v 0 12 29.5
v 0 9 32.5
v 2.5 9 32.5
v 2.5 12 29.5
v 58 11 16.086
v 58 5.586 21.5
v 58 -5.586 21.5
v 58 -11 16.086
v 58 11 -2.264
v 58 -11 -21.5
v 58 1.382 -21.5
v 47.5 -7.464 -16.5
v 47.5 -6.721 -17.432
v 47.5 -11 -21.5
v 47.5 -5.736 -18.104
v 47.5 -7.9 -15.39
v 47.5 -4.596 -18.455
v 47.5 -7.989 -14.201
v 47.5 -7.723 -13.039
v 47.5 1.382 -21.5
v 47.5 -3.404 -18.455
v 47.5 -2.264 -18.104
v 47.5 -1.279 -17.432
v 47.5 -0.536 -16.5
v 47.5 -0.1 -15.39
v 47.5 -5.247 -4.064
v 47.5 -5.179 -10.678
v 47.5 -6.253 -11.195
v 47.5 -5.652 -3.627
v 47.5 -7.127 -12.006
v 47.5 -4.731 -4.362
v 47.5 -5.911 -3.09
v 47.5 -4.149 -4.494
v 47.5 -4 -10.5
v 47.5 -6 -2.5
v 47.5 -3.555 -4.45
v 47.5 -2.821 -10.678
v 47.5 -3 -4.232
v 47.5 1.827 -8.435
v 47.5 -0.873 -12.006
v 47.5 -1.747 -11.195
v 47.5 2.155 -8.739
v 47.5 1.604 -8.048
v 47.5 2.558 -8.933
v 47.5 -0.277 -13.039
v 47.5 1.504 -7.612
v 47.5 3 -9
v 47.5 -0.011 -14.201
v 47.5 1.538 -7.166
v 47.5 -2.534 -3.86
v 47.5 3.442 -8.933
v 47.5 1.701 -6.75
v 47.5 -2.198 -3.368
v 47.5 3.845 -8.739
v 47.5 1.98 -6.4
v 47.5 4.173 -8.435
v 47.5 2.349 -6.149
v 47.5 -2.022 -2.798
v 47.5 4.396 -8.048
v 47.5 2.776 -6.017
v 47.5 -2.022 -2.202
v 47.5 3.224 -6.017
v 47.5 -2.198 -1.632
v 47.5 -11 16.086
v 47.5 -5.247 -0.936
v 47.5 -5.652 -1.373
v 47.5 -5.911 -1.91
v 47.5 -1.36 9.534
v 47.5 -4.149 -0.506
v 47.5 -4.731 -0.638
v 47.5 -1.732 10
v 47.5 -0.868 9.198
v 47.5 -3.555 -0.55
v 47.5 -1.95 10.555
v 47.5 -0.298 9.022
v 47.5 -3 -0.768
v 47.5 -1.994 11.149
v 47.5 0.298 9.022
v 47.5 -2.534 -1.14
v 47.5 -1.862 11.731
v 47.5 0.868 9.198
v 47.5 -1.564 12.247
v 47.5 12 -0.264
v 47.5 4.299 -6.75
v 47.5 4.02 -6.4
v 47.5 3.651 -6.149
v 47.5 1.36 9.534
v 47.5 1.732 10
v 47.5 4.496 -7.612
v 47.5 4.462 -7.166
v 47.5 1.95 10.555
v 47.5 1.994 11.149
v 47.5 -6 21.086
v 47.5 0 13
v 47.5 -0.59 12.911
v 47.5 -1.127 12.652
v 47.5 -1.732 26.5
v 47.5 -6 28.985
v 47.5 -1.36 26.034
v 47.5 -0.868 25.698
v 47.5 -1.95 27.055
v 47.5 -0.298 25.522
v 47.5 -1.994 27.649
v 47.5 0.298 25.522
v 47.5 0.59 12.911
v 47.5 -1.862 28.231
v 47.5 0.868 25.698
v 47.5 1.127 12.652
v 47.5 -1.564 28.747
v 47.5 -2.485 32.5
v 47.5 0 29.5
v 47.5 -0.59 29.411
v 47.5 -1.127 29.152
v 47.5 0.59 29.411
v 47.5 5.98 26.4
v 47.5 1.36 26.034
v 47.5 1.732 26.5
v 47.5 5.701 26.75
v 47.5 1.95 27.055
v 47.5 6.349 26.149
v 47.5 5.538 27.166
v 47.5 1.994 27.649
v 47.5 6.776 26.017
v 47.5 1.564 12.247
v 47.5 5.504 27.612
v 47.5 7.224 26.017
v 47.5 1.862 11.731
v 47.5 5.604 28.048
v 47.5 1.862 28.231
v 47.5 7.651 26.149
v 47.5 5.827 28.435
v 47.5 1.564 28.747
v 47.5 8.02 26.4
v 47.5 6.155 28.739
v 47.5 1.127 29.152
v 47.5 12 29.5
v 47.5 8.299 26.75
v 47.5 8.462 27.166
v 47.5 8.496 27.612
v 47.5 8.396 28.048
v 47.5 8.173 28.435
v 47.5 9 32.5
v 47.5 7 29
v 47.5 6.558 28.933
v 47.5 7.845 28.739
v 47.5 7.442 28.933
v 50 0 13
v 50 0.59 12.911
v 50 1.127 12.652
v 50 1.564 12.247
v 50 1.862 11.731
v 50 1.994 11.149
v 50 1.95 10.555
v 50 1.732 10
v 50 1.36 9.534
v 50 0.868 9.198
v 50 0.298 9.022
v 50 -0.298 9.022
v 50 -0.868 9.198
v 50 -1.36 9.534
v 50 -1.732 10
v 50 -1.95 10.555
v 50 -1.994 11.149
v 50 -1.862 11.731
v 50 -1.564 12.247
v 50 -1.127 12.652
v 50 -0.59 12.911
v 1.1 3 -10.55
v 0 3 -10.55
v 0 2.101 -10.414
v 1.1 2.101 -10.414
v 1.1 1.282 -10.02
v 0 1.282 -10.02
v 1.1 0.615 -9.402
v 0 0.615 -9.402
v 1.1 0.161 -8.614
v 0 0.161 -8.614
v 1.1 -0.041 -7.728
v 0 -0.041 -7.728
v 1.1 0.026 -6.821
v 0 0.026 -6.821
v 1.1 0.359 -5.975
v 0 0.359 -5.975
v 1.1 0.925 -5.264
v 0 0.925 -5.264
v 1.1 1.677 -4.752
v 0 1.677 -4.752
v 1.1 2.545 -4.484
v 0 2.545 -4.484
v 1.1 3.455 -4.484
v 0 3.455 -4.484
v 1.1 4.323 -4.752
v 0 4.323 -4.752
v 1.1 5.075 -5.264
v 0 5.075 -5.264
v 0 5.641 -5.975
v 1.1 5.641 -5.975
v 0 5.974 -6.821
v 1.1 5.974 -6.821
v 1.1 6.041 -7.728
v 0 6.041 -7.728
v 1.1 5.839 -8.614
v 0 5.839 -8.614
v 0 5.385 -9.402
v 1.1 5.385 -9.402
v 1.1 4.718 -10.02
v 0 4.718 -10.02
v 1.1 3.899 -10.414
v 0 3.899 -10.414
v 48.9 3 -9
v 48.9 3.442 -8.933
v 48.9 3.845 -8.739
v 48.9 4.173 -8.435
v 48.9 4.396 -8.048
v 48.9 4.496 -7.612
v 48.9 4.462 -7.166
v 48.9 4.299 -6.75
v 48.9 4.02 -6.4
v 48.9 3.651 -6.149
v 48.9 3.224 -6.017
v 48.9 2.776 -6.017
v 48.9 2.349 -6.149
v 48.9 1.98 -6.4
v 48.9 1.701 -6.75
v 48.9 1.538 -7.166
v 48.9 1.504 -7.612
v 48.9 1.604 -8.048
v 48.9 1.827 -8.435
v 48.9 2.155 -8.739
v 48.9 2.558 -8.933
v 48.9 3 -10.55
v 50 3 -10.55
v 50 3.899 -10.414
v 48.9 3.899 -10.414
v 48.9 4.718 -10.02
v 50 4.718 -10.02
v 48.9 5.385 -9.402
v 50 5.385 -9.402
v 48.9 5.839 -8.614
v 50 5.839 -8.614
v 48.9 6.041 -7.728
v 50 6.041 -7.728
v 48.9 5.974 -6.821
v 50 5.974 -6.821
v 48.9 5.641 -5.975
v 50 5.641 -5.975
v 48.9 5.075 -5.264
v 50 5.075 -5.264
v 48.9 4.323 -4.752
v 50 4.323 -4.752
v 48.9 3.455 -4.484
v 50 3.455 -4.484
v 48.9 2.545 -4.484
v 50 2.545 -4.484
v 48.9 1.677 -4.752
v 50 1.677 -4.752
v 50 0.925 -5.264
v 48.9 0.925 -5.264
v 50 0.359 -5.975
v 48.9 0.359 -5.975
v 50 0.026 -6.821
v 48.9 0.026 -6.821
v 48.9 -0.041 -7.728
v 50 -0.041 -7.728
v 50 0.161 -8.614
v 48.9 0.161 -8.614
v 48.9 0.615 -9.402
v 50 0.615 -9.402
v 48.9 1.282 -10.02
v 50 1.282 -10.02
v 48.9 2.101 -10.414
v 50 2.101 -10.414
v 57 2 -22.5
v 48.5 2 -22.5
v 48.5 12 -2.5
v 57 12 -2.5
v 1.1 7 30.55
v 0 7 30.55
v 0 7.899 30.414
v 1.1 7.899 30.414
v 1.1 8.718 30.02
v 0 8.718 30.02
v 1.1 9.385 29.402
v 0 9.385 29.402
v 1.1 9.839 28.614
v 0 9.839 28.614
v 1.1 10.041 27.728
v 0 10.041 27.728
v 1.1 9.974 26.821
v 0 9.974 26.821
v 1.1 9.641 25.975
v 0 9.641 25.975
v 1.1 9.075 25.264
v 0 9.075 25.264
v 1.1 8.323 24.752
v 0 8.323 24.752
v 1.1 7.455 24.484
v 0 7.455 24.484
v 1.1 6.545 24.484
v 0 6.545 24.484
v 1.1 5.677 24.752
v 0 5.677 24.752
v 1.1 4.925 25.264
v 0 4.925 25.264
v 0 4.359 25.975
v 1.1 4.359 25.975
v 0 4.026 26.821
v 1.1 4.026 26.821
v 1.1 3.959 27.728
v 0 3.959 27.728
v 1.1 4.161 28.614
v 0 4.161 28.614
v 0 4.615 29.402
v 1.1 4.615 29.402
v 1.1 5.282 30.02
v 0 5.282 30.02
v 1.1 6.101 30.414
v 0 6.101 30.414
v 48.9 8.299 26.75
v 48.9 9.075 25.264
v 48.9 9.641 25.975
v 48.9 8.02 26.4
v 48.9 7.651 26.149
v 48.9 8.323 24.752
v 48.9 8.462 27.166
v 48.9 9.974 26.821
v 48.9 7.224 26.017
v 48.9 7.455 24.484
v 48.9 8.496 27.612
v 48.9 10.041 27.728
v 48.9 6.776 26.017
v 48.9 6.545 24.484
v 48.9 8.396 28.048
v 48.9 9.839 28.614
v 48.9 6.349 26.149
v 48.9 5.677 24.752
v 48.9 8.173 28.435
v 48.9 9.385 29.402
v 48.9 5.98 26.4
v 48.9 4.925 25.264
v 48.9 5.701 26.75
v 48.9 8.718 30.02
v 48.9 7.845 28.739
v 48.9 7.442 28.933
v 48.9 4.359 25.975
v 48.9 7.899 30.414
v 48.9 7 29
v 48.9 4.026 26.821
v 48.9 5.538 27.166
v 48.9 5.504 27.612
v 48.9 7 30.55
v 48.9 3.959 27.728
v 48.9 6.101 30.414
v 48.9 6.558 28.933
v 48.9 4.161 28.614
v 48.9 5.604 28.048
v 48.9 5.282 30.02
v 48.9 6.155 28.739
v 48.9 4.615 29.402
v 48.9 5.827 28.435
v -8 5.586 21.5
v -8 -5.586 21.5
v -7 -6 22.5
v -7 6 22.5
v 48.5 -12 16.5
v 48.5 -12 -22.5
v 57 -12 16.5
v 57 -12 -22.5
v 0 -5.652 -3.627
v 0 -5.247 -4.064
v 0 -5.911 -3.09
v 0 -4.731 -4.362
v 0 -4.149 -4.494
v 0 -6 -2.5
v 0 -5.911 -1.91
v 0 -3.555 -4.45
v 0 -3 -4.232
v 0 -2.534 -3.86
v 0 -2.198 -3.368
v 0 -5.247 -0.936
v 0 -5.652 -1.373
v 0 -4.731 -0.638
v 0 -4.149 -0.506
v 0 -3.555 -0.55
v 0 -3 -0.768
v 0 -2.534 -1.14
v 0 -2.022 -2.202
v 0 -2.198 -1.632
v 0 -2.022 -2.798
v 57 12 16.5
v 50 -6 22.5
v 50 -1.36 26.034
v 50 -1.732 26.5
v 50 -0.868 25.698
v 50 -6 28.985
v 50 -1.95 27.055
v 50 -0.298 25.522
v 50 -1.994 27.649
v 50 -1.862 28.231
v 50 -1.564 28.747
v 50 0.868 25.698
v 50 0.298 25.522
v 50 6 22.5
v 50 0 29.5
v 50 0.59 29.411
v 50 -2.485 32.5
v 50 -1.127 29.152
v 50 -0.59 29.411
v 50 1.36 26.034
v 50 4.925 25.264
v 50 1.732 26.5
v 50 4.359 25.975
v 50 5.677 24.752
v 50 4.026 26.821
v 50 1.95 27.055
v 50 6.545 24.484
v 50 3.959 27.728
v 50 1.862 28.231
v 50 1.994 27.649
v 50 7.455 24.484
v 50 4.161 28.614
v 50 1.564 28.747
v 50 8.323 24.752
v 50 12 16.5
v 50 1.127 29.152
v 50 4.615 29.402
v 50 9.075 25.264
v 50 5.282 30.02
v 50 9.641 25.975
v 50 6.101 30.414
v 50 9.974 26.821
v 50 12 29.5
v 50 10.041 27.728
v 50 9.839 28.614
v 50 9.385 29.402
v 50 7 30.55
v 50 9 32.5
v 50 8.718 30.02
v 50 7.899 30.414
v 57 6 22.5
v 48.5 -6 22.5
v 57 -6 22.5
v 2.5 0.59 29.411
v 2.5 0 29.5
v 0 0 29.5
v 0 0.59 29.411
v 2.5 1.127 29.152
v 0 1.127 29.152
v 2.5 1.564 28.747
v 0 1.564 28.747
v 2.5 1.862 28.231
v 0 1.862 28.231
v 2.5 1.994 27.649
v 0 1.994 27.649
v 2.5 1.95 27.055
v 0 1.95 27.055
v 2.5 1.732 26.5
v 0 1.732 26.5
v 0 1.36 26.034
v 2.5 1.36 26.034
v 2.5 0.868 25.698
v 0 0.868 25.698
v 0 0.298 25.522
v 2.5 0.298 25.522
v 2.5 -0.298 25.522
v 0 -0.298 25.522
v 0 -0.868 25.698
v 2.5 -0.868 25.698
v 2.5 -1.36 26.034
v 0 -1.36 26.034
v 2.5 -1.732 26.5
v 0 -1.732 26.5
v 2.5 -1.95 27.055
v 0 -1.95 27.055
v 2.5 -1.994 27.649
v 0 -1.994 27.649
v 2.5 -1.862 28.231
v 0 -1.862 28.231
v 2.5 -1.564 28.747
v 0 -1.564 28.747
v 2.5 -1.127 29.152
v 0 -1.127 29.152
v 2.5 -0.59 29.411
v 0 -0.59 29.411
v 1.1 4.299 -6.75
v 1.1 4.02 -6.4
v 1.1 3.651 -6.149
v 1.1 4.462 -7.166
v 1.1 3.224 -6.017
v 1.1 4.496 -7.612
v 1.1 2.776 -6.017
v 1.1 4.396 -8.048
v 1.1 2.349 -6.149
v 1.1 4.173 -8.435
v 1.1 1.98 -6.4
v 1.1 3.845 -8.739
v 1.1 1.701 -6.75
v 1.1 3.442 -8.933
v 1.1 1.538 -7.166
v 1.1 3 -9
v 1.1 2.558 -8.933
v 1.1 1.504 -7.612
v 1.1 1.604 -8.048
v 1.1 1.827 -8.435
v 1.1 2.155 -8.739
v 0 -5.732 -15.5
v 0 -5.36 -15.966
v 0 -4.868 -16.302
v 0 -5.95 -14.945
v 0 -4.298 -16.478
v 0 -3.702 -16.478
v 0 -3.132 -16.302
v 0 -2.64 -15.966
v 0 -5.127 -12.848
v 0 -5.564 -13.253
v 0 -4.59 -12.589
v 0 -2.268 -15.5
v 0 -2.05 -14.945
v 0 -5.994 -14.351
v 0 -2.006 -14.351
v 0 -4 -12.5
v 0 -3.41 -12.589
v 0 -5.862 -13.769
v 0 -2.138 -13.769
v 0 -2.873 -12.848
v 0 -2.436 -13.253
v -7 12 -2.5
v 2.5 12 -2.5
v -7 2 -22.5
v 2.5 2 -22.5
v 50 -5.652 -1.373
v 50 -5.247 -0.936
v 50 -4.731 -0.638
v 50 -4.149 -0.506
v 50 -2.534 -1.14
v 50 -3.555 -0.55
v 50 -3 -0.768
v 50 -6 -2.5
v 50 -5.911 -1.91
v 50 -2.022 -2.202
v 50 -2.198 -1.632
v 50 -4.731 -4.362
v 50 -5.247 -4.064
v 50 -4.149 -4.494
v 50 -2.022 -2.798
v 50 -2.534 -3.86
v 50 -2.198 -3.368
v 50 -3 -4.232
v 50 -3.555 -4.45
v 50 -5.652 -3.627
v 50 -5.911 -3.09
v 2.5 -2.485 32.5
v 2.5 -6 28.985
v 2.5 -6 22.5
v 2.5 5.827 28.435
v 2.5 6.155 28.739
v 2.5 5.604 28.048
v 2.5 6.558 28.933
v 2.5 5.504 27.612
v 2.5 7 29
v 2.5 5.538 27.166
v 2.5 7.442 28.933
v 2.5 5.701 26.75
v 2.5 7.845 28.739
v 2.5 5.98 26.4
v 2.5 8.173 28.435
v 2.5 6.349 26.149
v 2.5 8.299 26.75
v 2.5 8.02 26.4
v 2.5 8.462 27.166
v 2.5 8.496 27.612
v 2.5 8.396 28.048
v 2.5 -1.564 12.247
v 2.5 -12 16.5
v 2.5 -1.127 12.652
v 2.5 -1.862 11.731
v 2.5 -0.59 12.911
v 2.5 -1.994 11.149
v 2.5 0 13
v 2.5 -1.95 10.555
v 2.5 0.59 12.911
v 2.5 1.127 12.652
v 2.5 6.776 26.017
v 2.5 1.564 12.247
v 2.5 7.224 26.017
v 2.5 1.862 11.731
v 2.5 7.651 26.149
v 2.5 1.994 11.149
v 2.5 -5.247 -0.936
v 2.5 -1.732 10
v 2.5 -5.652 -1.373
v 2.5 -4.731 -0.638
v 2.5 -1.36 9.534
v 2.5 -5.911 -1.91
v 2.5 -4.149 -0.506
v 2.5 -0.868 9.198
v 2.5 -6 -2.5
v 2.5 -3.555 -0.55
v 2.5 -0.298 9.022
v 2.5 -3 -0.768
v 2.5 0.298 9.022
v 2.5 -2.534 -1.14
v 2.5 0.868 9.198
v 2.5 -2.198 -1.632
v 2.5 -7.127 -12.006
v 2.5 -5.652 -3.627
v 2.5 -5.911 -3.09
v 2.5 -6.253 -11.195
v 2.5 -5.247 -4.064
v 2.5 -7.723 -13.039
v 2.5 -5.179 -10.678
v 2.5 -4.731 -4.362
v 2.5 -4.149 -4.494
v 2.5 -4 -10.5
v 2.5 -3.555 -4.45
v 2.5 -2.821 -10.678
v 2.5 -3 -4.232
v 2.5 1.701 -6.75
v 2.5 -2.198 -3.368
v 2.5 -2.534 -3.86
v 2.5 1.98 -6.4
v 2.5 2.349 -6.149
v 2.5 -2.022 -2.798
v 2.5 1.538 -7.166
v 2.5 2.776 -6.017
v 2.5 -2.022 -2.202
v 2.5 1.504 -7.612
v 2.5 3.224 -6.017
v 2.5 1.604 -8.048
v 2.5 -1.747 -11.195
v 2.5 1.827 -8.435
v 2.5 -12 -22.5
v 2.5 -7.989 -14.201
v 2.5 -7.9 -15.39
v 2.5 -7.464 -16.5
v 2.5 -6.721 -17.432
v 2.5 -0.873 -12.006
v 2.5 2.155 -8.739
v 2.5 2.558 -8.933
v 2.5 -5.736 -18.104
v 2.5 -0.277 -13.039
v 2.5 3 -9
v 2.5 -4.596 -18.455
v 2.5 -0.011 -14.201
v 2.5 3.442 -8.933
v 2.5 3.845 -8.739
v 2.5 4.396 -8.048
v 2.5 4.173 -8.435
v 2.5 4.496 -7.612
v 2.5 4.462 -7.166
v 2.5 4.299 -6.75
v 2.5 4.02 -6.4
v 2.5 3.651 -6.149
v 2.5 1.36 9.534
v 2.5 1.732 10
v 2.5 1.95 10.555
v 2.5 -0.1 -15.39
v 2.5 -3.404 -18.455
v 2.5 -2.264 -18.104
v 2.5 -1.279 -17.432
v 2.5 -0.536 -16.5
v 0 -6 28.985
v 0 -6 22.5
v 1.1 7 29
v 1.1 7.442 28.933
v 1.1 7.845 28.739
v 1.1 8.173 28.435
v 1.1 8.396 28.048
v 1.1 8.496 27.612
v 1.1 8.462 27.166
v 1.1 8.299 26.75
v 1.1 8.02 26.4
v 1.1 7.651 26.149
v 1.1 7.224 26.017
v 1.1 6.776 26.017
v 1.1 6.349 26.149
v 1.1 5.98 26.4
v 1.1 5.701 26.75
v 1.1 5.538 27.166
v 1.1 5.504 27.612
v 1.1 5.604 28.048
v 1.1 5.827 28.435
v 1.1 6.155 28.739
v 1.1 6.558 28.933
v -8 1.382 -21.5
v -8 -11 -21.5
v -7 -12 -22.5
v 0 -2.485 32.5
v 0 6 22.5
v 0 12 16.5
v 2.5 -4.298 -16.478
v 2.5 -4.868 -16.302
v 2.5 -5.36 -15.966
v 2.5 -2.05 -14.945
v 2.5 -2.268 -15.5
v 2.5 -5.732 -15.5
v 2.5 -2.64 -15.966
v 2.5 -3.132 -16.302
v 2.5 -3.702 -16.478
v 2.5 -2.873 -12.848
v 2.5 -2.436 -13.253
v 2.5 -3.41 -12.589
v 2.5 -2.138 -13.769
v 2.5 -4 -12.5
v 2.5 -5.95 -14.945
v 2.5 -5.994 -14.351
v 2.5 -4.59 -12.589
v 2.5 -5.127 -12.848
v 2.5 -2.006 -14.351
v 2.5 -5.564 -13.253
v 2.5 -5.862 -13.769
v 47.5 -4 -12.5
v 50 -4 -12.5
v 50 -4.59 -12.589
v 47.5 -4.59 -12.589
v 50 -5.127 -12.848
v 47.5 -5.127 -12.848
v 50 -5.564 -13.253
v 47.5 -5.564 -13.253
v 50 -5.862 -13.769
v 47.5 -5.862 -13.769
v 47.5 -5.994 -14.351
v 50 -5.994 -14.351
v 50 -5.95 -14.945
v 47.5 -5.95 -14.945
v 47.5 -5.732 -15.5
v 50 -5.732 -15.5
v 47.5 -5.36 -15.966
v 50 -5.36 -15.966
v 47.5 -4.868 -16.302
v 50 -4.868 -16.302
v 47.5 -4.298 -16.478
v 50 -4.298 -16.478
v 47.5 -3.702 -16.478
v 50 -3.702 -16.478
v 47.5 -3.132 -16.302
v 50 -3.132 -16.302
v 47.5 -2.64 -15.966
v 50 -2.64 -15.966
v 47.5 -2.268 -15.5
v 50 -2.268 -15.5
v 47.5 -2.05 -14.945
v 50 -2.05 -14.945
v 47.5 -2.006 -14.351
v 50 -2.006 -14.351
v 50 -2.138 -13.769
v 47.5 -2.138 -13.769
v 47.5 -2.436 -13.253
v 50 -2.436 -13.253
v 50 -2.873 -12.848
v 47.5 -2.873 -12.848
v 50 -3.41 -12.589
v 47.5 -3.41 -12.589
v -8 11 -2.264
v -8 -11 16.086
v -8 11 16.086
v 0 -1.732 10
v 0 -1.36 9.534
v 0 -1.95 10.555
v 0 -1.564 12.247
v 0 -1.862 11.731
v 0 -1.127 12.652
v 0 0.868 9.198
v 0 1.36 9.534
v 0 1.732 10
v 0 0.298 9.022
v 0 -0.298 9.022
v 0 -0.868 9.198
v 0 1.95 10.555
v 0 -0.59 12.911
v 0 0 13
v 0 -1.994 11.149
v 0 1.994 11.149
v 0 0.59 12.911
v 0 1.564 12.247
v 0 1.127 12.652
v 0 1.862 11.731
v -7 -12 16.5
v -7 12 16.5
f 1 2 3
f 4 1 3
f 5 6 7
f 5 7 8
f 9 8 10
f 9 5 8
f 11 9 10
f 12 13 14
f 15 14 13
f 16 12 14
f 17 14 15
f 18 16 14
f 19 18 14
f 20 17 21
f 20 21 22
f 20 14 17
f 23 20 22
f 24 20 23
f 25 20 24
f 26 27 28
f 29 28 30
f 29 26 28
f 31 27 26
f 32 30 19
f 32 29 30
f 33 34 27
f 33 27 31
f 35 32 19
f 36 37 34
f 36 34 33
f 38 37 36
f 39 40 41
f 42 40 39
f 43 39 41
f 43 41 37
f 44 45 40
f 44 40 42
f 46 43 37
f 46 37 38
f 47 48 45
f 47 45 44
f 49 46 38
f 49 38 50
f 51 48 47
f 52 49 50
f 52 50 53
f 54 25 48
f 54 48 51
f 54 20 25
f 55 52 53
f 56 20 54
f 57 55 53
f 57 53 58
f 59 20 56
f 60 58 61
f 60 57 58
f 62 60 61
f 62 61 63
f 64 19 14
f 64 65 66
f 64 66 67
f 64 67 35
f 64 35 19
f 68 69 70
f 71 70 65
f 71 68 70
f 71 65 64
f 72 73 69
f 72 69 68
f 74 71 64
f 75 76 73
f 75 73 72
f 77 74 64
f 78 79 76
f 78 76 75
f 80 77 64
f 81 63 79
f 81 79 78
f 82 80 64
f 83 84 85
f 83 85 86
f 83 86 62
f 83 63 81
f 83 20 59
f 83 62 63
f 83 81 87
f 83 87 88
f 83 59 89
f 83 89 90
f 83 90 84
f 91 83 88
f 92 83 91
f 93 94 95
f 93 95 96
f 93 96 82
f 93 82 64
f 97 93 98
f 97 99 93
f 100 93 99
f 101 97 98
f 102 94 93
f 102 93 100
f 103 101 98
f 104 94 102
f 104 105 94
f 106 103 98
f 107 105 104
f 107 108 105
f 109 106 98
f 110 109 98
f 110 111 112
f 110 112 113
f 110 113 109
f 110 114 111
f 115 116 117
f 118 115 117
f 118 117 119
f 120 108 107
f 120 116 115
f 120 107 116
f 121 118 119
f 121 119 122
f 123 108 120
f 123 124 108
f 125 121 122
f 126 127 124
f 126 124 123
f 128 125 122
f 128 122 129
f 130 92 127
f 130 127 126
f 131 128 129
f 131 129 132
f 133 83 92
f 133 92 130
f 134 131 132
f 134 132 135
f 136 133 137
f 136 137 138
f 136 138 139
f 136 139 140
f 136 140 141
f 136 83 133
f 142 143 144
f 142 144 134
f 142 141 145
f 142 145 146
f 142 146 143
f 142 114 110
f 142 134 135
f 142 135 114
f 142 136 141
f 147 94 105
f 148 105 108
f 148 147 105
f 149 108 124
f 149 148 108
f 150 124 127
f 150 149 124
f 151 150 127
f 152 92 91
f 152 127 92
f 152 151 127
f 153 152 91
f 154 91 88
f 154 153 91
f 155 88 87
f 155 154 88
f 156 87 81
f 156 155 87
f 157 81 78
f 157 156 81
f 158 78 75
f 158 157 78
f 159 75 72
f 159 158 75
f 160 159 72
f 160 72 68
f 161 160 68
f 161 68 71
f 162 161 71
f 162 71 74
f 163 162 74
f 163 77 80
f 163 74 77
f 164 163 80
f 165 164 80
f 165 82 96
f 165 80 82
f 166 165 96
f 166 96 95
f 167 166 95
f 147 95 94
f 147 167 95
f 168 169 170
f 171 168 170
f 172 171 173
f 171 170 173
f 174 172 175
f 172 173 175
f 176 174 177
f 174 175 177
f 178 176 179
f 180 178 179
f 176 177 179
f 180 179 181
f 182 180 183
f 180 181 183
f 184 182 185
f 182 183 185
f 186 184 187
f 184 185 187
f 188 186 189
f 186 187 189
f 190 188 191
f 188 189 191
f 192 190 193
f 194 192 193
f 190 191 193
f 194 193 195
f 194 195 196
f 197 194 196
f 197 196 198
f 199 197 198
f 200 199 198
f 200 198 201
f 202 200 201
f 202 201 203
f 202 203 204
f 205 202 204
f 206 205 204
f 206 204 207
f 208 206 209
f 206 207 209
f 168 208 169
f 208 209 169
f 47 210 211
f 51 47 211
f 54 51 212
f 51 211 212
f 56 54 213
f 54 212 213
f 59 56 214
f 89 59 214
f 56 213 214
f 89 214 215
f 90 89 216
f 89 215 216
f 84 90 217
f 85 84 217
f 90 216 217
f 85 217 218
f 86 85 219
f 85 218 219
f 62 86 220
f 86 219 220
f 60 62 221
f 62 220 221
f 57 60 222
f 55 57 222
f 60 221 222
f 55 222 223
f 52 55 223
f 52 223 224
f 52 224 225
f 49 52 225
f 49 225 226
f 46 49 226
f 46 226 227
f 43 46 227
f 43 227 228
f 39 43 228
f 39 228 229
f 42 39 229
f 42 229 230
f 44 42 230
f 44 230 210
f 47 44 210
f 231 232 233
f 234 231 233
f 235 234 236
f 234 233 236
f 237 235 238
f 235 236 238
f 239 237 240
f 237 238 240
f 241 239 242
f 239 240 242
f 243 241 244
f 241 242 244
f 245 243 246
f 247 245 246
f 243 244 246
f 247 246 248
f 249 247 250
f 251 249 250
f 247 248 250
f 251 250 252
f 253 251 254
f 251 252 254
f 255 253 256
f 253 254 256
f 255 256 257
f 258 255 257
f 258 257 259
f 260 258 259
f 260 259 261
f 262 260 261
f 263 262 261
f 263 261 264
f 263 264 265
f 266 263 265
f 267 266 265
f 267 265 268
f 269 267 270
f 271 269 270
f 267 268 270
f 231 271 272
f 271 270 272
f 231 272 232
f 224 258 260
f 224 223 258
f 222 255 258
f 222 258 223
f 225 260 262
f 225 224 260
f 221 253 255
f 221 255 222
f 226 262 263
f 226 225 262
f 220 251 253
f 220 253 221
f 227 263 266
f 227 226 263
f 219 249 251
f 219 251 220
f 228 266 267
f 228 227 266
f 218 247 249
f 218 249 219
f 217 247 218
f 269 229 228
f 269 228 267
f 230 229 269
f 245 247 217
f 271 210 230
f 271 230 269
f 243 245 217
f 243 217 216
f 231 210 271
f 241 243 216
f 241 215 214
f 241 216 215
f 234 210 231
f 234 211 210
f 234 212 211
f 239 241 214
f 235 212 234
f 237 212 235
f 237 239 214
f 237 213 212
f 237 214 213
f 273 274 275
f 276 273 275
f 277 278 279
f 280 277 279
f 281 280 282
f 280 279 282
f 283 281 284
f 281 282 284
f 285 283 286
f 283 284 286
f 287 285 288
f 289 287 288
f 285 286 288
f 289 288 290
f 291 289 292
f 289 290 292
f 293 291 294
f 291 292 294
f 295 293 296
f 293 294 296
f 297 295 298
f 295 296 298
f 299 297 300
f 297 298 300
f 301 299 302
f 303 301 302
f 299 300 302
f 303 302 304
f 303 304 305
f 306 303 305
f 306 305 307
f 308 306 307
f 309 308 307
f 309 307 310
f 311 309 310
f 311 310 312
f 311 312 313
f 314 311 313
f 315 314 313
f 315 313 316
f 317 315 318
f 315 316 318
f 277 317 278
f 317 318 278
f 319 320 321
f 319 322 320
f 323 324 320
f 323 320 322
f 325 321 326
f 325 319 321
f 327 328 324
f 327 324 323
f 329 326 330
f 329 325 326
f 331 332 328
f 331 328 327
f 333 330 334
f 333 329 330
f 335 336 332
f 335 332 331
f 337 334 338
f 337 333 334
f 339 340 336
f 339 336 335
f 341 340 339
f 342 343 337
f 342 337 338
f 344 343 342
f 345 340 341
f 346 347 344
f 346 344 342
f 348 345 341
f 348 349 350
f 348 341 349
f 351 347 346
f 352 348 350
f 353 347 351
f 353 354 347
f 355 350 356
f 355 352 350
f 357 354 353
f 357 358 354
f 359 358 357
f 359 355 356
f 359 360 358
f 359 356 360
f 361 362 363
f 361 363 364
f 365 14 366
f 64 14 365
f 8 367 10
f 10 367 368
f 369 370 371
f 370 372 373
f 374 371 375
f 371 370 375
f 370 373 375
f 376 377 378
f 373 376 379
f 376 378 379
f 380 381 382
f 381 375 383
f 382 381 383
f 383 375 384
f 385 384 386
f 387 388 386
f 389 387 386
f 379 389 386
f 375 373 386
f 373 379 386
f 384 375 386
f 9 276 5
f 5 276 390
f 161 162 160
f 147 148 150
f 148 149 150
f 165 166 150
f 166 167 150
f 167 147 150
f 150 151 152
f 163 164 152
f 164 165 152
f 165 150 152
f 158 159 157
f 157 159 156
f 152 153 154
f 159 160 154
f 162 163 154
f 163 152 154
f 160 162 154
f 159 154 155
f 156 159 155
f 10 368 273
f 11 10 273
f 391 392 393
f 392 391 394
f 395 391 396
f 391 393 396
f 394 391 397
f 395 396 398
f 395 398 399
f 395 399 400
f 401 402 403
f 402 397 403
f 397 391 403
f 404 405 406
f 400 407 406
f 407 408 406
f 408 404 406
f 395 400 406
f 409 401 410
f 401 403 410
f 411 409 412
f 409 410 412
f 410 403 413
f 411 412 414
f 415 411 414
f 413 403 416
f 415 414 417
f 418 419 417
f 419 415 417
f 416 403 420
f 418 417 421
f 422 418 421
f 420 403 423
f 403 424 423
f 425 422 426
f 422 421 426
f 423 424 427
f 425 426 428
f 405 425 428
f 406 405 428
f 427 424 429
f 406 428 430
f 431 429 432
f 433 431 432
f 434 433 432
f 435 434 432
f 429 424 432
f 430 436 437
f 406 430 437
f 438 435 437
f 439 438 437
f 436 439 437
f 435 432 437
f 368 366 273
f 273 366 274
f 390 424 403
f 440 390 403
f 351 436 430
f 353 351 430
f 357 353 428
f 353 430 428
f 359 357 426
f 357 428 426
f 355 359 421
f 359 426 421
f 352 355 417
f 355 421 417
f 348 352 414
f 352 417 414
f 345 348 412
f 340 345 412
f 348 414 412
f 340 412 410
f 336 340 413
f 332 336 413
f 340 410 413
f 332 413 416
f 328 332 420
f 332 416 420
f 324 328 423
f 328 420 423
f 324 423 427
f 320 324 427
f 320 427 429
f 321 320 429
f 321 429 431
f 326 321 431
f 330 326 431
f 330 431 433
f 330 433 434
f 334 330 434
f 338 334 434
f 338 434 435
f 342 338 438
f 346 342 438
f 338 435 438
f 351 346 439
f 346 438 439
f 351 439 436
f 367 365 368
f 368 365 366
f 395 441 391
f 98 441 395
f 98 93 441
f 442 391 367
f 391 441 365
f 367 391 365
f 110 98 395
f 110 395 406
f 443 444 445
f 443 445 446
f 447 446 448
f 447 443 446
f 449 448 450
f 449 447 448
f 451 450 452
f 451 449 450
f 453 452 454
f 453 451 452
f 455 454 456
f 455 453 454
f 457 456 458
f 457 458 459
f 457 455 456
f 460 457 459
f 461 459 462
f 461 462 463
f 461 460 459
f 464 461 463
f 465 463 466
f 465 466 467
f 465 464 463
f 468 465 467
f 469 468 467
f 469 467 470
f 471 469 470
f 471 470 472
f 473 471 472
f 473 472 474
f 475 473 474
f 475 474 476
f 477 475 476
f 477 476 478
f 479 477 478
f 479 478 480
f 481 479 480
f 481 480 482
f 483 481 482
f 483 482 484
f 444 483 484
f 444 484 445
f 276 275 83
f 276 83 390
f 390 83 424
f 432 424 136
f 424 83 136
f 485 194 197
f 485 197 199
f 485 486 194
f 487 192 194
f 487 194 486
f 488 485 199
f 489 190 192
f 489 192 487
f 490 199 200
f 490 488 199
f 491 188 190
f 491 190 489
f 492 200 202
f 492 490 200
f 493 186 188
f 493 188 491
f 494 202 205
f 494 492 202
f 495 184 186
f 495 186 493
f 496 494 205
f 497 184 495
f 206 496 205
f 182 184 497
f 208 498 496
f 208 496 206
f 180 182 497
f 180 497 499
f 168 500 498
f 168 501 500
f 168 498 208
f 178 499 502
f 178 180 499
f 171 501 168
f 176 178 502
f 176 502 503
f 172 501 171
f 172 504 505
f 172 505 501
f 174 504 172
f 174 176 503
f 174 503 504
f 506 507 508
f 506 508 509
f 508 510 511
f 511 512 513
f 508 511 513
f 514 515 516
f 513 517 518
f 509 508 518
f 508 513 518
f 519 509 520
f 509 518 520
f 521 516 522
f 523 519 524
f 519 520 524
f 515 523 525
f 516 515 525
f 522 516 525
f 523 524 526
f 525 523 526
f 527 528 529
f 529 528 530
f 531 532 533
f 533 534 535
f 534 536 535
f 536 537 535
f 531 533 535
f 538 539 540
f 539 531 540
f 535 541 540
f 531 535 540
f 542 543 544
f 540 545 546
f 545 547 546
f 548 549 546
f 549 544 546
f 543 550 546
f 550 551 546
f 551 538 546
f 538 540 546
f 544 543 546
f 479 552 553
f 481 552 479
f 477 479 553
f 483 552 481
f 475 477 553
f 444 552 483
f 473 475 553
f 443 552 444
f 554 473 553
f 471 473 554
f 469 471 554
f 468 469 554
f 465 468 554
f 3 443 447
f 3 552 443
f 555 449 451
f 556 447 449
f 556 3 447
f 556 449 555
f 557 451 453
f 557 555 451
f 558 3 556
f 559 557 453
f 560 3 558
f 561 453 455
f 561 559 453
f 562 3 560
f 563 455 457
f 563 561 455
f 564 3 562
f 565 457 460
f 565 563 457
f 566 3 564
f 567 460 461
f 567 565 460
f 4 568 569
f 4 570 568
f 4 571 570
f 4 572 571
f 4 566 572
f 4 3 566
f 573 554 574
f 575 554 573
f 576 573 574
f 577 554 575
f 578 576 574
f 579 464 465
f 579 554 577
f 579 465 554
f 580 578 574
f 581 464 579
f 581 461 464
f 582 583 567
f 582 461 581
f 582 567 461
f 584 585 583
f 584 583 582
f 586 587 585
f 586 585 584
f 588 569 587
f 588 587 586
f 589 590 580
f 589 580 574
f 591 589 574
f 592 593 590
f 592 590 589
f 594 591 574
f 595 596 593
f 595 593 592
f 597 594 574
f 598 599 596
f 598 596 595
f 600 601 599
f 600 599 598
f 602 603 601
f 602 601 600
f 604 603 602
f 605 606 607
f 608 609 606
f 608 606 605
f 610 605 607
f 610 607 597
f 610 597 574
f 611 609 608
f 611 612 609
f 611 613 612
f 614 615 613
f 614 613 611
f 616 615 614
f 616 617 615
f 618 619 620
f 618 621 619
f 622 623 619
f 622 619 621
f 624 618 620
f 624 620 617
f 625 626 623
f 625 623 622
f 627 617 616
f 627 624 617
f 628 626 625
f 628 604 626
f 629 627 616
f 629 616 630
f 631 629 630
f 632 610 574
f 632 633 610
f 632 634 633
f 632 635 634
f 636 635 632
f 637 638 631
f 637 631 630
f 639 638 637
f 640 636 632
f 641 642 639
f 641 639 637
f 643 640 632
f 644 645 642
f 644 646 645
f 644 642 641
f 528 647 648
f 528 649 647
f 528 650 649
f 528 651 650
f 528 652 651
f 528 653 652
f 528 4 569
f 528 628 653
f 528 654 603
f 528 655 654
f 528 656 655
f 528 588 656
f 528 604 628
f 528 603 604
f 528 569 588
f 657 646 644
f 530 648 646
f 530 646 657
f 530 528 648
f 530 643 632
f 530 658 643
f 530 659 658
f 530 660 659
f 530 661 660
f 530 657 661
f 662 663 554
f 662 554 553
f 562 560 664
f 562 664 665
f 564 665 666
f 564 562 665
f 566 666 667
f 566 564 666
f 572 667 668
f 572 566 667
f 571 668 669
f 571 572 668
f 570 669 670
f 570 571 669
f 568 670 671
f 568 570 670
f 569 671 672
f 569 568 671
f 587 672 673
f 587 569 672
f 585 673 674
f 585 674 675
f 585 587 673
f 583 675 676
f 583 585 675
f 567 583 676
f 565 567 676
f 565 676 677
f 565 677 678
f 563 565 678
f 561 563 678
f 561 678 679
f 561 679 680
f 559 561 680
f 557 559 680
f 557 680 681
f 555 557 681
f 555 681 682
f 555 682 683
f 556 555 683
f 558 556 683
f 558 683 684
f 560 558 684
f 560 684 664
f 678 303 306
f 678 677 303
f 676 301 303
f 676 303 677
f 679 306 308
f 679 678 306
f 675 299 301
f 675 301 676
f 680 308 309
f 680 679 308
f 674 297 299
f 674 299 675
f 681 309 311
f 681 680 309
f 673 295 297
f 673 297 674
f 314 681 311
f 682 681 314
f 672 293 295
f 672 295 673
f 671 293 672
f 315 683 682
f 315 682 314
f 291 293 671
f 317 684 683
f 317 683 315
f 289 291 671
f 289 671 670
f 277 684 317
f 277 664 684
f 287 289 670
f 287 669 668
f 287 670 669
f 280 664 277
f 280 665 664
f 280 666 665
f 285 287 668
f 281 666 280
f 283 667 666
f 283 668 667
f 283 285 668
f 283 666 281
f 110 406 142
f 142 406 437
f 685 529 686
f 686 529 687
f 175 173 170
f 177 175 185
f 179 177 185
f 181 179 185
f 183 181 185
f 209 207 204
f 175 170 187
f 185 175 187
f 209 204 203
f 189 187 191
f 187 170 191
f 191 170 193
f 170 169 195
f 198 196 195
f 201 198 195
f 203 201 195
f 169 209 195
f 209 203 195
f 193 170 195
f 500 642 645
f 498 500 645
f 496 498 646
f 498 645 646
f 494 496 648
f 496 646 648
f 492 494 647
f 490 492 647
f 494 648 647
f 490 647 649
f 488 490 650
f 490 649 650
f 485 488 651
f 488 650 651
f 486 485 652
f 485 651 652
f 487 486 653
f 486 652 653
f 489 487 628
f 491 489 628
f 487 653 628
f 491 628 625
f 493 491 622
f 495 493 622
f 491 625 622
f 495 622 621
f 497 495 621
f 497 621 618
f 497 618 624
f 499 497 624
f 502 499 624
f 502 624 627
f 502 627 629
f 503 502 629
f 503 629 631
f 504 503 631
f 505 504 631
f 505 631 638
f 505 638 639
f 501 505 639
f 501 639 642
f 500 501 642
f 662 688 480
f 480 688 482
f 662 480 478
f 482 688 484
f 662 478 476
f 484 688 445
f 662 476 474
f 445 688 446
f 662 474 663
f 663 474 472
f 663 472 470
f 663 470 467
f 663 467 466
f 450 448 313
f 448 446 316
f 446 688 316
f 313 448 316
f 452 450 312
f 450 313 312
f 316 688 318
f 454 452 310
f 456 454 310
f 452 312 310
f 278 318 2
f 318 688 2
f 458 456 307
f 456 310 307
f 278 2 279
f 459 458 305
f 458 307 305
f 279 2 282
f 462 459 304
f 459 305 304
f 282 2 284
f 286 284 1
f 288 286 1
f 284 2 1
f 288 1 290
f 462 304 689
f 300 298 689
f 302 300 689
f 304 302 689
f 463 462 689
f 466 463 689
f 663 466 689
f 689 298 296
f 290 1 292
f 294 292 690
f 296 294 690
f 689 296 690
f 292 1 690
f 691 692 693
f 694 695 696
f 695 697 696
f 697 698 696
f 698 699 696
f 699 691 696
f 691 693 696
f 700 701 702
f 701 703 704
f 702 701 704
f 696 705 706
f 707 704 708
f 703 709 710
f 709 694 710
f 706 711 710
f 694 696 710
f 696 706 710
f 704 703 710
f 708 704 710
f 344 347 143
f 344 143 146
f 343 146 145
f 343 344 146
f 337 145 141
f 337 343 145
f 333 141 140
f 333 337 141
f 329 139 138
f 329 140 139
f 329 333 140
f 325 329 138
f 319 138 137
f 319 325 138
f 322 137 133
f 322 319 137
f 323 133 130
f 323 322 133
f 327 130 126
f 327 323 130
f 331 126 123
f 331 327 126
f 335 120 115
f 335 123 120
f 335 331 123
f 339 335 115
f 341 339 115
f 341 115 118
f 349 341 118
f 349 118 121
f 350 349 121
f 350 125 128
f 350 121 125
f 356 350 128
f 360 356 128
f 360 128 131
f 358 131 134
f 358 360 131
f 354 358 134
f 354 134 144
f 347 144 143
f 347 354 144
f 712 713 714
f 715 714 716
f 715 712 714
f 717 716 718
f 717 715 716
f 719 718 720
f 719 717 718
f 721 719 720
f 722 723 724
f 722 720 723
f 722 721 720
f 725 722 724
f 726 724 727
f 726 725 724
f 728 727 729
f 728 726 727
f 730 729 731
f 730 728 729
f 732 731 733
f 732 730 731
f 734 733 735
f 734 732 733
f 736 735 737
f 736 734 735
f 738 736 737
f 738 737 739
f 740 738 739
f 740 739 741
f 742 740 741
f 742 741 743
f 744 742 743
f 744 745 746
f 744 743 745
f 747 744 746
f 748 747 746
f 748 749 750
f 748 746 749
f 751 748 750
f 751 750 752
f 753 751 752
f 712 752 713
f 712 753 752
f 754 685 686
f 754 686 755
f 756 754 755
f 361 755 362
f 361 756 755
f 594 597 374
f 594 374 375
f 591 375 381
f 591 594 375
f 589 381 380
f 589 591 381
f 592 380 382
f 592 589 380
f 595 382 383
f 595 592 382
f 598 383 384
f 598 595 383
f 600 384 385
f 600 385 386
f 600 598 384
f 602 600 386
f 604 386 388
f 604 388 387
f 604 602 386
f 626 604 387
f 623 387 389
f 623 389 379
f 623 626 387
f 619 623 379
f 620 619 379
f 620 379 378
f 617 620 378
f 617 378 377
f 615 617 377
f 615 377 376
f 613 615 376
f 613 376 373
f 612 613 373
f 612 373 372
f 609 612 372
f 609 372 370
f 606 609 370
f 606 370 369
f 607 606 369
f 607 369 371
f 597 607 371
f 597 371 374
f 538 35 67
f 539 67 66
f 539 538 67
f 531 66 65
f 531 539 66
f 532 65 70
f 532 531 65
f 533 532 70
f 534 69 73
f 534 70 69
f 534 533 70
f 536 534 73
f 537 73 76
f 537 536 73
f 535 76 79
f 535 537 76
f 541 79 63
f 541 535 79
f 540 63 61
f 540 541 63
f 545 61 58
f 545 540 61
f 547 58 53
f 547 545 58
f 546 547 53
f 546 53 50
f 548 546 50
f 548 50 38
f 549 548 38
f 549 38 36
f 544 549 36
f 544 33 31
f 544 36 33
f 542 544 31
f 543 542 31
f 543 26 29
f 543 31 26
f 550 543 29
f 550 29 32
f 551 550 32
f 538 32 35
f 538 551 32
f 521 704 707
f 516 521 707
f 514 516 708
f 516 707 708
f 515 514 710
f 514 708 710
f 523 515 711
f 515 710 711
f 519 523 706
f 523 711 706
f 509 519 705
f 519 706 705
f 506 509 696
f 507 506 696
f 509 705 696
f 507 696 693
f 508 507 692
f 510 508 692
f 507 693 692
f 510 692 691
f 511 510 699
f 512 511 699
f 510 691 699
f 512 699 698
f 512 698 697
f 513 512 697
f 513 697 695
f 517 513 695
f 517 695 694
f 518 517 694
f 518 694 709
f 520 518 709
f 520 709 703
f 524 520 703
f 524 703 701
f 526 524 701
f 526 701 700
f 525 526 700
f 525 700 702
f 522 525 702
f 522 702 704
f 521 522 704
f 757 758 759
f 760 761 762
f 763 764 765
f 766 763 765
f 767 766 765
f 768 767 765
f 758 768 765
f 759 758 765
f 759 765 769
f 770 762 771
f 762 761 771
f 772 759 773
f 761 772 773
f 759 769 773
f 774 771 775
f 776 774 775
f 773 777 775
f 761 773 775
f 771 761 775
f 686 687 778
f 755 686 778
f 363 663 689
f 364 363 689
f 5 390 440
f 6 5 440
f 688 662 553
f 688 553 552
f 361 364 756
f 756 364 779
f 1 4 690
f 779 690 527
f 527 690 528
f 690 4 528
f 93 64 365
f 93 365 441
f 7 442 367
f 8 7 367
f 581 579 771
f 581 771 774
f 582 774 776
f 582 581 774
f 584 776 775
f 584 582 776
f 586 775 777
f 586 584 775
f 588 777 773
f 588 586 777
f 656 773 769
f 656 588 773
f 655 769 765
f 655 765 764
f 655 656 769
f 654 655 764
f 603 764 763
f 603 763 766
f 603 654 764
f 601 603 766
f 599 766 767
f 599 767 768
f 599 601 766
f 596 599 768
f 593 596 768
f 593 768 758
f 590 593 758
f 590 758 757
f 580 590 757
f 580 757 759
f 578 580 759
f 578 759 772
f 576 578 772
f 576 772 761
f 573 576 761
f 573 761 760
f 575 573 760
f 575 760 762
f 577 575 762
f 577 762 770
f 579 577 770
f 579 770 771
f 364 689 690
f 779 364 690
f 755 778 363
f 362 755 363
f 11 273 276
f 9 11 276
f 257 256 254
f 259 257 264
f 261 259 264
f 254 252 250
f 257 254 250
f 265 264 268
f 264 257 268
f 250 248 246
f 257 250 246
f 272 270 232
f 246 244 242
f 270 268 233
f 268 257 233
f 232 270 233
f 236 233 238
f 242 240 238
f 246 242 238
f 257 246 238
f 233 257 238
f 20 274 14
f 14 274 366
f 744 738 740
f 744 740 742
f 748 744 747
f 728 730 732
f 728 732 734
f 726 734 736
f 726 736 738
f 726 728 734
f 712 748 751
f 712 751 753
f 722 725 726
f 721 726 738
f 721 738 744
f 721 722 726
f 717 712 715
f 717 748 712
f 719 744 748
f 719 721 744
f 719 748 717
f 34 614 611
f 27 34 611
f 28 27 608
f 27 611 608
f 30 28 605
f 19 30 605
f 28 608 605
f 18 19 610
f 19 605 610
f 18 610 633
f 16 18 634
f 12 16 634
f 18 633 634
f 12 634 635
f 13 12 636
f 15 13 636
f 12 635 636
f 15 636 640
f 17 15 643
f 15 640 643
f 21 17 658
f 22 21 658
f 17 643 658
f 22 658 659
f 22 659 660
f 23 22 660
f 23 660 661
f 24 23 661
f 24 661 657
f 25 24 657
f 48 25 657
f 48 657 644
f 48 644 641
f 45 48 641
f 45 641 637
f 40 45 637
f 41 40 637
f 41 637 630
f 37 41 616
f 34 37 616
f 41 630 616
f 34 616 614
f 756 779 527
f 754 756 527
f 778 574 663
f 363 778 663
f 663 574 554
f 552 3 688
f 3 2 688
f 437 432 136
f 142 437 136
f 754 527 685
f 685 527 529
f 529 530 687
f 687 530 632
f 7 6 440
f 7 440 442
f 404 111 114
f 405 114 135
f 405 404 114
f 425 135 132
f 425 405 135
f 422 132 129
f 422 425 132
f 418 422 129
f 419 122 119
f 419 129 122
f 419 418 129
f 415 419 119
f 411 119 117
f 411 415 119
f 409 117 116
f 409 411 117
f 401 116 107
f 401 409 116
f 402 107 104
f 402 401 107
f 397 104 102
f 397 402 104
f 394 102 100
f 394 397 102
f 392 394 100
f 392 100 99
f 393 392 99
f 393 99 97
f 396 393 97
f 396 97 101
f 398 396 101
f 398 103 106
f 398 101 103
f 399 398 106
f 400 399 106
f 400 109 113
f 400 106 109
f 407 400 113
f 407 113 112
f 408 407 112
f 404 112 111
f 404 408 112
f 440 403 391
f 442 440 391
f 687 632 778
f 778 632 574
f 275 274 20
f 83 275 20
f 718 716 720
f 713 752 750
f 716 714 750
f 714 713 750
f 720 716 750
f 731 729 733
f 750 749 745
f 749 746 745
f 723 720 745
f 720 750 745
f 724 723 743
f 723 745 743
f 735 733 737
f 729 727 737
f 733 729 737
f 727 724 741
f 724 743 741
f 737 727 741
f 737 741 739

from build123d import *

# Parameters (mm, degrees)
SKETCH2_W                      = 45
SKETCH2_H                      = 24
BOSS_EXTRUDE1_DEPTH            = 50
CUT_EXTRUDE7_DEPTH             = 50
CHAMFER4_SIZE                  = 6
CUT_EXTRUDE1_REACH             = 70.33
SKETCH3_W                      = 45
SKETCH3_H                      = 10
CUT_EXTRUDE2_REACH             = 55.912
SKETCH4_R                      = 2
CUT_EXTRUDE2_DIRECTION_2_REACH = 55.912
SKETCH8_W                      = 45
SKETCH8_H                      = 50
CUT_EXTRUDE4_DEPTH             = 14
SKETCH6_R                      = 4
BOSS_EXTRUDE2_DEPTH            = 45
CUT_EXTRUDE3_START             = -50
SKETCH7_R                      = 2
CUT_EXTRUDE3_DEPTH             = 50
CUT_EXTRUDE6_START             = -2.5
SKETCH13_R                     = 2
CUT_EXTRUDE6_DEPTH             = 50
BOSS_EXTRUDE16_REACH           = 58.127
CUT_EXTRUDE13_REACH            = 64.292
SKETCH30_W                     = 45
SKETCH30_H                     = 10
CUT_EXTRUDE18_START            = -50
SKETCH37_R                     = 2
CUT_EXTRUDE18_DEPTH            = 50
CUT_EXTRUDE20_REACH            = 62.83
SKETCH43_R                     = 1.5
SKETCH44_R                     = 3.05
CUT_EXTRUDE21_DEPTH            = 1.1
SKETCH45_R                     = 3.05
CUT_EXTRUDE22_DEPTH            = 1.1
BOSS_EXTRUDE23_DEPTH           = 2.5
BOSS_EXTRUDE24_DEPTH           = 2.5
SKETCH55_R                     = 3.05
CUT_EXTRUDE28_DEPTH            = 1.1
CUT_EXTRUDE29_START            = -50
SKETCH57_R                     = 1.5
CUT_EXTRUDE29_DEPTH            = 48.9
SKETCH58_R                     = 3.05
CUT_EXTRUDE30_DEPTH            = 1.1
CHAMFER11_SIZE                 = 3
BOSS_EXTRUDE19_DEPTH           = 8
BOSS_EXTRUDE20_DEPTH           = 8
CHAMFER7_SIZE                  = 1
CHAMFER8_SIZE                  = 1


with BuildPart() as part:
    # Sketch2 → Boss-Extrude1 (new body)
    with BuildSketch(Plane(origin=(0, 0, 0), x_dir=(0, 0, -1), z_dir=(1, 0, 0))):
        Rectangle(SKETCH2_W, SKETCH2_H)
    extrude(amount=BOSS_EXTRUDE1_DEPTH)

    # Sketch14 → Cut-Extrude7 (cut)
    with BuildSketch(Plane(origin=(50, 0, 0), x_dir=(0, 0, -1), z_dir=(1, 0, 0))):
        Polygon((2.5, 12), (22.5, 2), (22.5, 12), align=None)
    extrude(amount=-CUT_EXTRUDE7_DEPTH, mode=Mode.SUBTRACT)

    # Chamfer4
    chamfer4_edges = [part.edges().sort_by_distance(p)[0] for p in [
        (25, -12, 22.5),
        (25, 12, 22.5),
    ]]
    chamfer(chamfer4_edges, length=CHAMFER4_SIZE)

    # Cut-Extrude1: up to this face of the body (flat: up to its plane)
    cut_extrude1_end = Plane(part.part.faces().sort_by_distance((25, 0, 22.5))[0])
    # Sketch3 → Cut-Extrude1 (cut, up to the picked face)
    with BuildSketch(Plane(origin=(0, 0, -22.5), x_dir=(-1, 0, 0), z_dir=(0, 0, -1)), mode=Mode.PRIVATE) as cut_extrude1_sk1:
        with Locations((-25, -7)):
            Rectangle(SKETCH3_W, SKETCH3_H)
    cut_extrude1_tool1 = split(extrude(cut_extrude1_sk1.sketch, amount=-CUT_EXTRUDE1_REACH, mode=Mode.PRIVATE), bisect_by=cut_extrude1_end, keep=Keep.BOTH, mode=Mode.PRIVATE)
    add(cut_extrude1_tool1.solids().sort_by(Axis((25, -7, -22.5), (0, 0, 1)))[0], mode=Mode.SUBTRACT)

    # Cut-Extrude2: up to this face of the body (flat: up to its plane)
    cut_extrude2_end = Plane(part.part.faces().sort_by_distance((50, -0.918079096, 0.895480226))[0])
    # Sketch4 → Cut-Extrude2 (cut, up to the picked face)
    with BuildSketch(Plane(origin=(2.5, 0, 0), x_dir=(0, 0, -1), z_dir=(1, 0, 0)), mode=Mode.PRIVATE) as cut_extrude2_sk1:
        with Locations(Location((14.5, -4, 0), (0, 0, 180))):
            Circle(SKETCH4_R)
    cut_extrude2_tool1 = split(extrude(cut_extrude2_sk1.sketch, amount=CUT_EXTRUDE2_REACH, mode=Mode.PRIVATE), bisect_by=cut_extrude2_end, keep=Keep.BOTH, mode=Mode.PRIVATE)
    add(cut_extrude2_tool1.solids().sort_by(Axis((2.5, -4, -14.5), (1, 0, 0)))[0], mode=Mode.SUBTRACT)

    # Cut-Extrude2 direction 2: up to this face of the body (flat: up to its plane)
    cut_extrude2_direction_2_end = Plane(part.part.faces().sort_by_distance((0, -0.918079096, 0.895480226))[0])
    # Sketch4 → Cut-Extrude2 direction 2 (cut, up to the picked face)
    with BuildSketch(Plane(origin=(2.5, 0, 0), x_dir=(0, 0, -1), z_dir=(1, 0, 0)), mode=Mode.PRIVATE) as cut_extrude2_direction_2_sk1:
        with Locations(Location((14.5, -4, 0), (0, 0, 180))):
            Circle(SKETCH4_R)
    cut_extrude2_direction_2_tool1 = split(extrude(cut_extrude2_direction_2_sk1.sketch, amount=-CUT_EXTRUDE2_DIRECTION_2_REACH, mode=Mode.PRIVATE), bisect_by=cut_extrude2_direction_2_end, keep=Keep.BOTH, mode=Mode.PRIVATE)
    add(cut_extrude2_direction_2_tool1.solids().sort_by(Axis((2.5, -4, -14.5), (-1, 0, 0)))[0], mode=Mode.SUBTRACT)

    # Sketch8 → Cut-Extrude4 (cut)
    with BuildSketch(Plane(origin=(0, 12, 0), x_dir=(1, 0, 0), z_dir=(0, 1, 0))):
        with Locations((25, 2.5)):
            Rectangle(SKETCH8_W, SKETCH8_H)
    extrude(amount=-CUT_EXTRUDE4_DEPTH, mode=Mode.SUBTRACT)


with BuildPart() as cut_extrude4_piece_1:
    # of the separate pieces the step leaves, piece 1, a body of its own (cut_extrude4_pieces)
    add(part.part.solids().sort_by_distance((0, -12, 16.5))[0])


with BuildPart() as cut_extrude4_piece_2:
    # of the separate pieces the step leaves, piece 2, a body of its own (cut_extrude4_pieces)
    add(part.part.solids().sort_by_distance((50, 2, -22.5))[0])

    # Sketch6 → Boss-Extrude2 (add)
    with BuildSketch(Plane(origin=(2.5, 0, 0), x_dir=(0, 0, -1), z_dir=(1, 0, 0))):
        with Locations(Location((14.5, -4, 0), (0, 0, 180))):
            Circle(SKETCH6_R)
    extrude(amount=BOSS_EXTRUDE2_DEPTH)


with BuildPart() as cut_extrude3_tool:
    # Sketch7 → Cut-Extrude3 (new body)
    with BuildSketch(Plane.ZY.offset(CUT_EXTRUDE3_START)):
        with Locations((11, 0)):
            Circle(SKETCH7_R)
    extrude(amount=CUT_EXTRUDE3_DEPTH)


with BuildPart() as cut_extrude4_piece_1_1:
    add(cut_extrude4_piece_1.part)

    # Cut-Extrude3: cut by cut_extrude3_tool
    add(cut_extrude3_tool.part, mode=Mode.SUBTRACT)


with BuildPart() as cut_extrude4_piece_2_1:
    add(cut_extrude4_piece_2.part)

    # Cut-Extrude3: cut by cut_extrude3_tool
    add(cut_extrude3_tool.part, mode=Mode.SUBTRACT)


with BuildPart() as cut_extrude6_tool:
    # Sketch13 → Cut-Extrude6 (new body)
    with BuildSketch(Plane.ZY.offset(-47.5).offset(CUT_EXTRUDE6_START)):
        with Locations(Location((-2.5, -4, 0), (0, 0, 270))):
            Circle(SKETCH13_R)
    extrude(amount=CUT_EXTRUDE6_DEPTH)


with BuildPart() as cut_extrude4_piece_1_2:
    add(cut_extrude4_piece_1_1.part)

    # Cut-Extrude6: cut by cut_extrude6_tool
    add(cut_extrude6_tool.part, mode=Mode.SUBTRACT)


with BuildPart() as cut_extrude4_piece_2_2:
    add(cut_extrude4_piece_2_1.part)

    # Cut-Extrude6: cut by cut_extrude6_tool
    add(cut_extrude6_tool.part, mode=Mode.SUBTRACT)

    # Boss-Extrude16: up to this face of the body (flat: up to its plane)
    boss_extrude16_end = Plane(cut_extrude4_piece_2_2.part.faces().sort_by_distance((50, -0.845343651, 1.015922603))[0])
    # Sketch29 → Boss-Extrude16 (add, up to the picked face)
    with BuildSketch(Plane.ZY, mode=Mode.PRIVATE) as boss_extrude16_sk1:
        Polygon((28.985281374, 6), (22.5, 6), (22.5, -6), (28.985281374, -6), (32.5, -2.485281374), (32.5, 2.485281374), align=None)
    boss_extrude16_tool1 = split(extrude(boss_extrude16_sk1.sketch, amount=-BOSS_EXTRUDE16_REACH, mode=Mode.PRIVATE), bisect_by=boss_extrude16_end, keep=Keep.BOTH, mode=Mode.PRIVATE)

    add(cut_extrude4_piece_1_2.part)  # Boss-Extrude16 merges Cut-Extrude4 piece 1
    add(boss_extrude16_tool1.solids().sort_by(Axis((0, 0, 27.06066), (1, 0, 0)))[0])

    # Cut-Extrude13: up to this plane
    cut_extrude13_end = Plane(origin=(65.620499352, -6, 28.985281374), z_dir=(0, -0.7071067811865474, 0.7071067811865477))
    # Sketch30 → Cut-Extrude13 (cut, up to the surface)
    with BuildSketch(Plane(origin=(0, 6, 0), x_dir=(1, 0, 0), z_dir=(0, 1, 0)), mode=Mode.PRIVATE) as cut_extrude13_sk1:
        with Locations((25, -27.5)):
            Rectangle(SKETCH30_W, SKETCH30_H)
    cut_extrude13_tool1 = split(extrude(cut_extrude13_sk1.sketch, amount=-CUT_EXTRUDE13_REACH, mode=Mode.PRIVATE), bisect_by=cut_extrude13_end, keep=Keep.BOTH, mode=Mode.PRIVATE)
    add(cut_extrude13_tool1.solids().sort_by_distance((25, 6, 27.5))[0], mode=Mode.SUBTRACT)

    # Sketch37 → Cut-Extrude18 (cut)
    with BuildSketch(Plane.ZY.offset(CUT_EXTRUDE18_START)):
        with Locations((27.5, 0)):
            Circle(SKETCH37_R)
    extrude(amount=CUT_EXTRUDE18_DEPTH, mode=Mode.SUBTRACT)

    # Cut-Extrude20: up to this face of the body (flat: up to its plane)
    cut_extrude20_end = Plane(cut_extrude4_piece_2_2.part.faces().sort_by_distance((0, -0.765078921, 3.483337135))[0])
    # Sketch43 → Cut-Extrude20 (cut, up to the picked face)
    with BuildSketch(Plane(origin=(50, 0, 0), x_dir=(0, 0, -1), z_dir=(1, 0, 0)), mode=Mode.PRIVATE) as cut_extrude20_sk1:
        with Locations((7.5, 3)):
            Circle(SKETCH43_R)
    cut_extrude20_tool1 = split(extrude(cut_extrude20_sk1.sketch, amount=-CUT_EXTRUDE20_REACH, mode=Mode.PRIVATE), bisect_by=cut_extrude20_end, keep=Keep.BOTH, mode=Mode.PRIVATE)
    add(cut_extrude20_tool1.solids().sort_by(Axis((50, 3, -7.5), (-1, 0, 0)))[0], mode=Mode.SUBTRACT)

    # Sketch44 → Cut-Extrude21 (cut)
    with BuildSketch(Plane(origin=(50, 0, 0), x_dir=(0, 0, -1), z_dir=(1, 0, 0))):
        with Locations((7.5, 3)):
            Circle(SKETCH44_R)
    extrude(amount=-CUT_EXTRUDE21_DEPTH, mode=Mode.SUBTRACT)

    # Sketch45 → Cut-Extrude22 (cut)
    with BuildSketch(Plane.ZY):
        with Locations(Location((-7.5, 3, 0), (0, 0, 180))):
            Circle(SKETCH45_R)
    extrude(amount=-CUT_EXTRUDE22_DEPTH, mode=Mode.SUBTRACT)

    # Sketch48 → Boss-Extrude23 (add)
    with BuildSketch(Plane(origin=(50, 0, 0), x_dir=(0, 0, -1), z_dir=(1, 0, 0))):
        Polygon((-16.5, 12), (-22.5, 6), (-28.985281374, 6), (-32.5, 2.485281374), (-32.5, 12), align=None)
    extrude(amount=-BOSS_EXTRUDE23_DEPTH)

    # Sketch49 → Boss-Extrude24 (add)
    with BuildSketch(Plane.ZY):
        Polygon((28.985281374, 6), (22.5, 6), (16.5, 12), (32.5, 12), (32.5, 2.485281374), align=None)
    extrude(amount=-BOSS_EXTRUDE24_DEPTH)

    # Sketch55 → Cut-Extrude28 (cut)
    with BuildSketch(Plane.ZY):
        with Locations((27.5, 7)):
            Circle(SKETCH55_R)
    extrude(amount=-CUT_EXTRUDE28_DEPTH, mode=Mode.SUBTRACT)

    # Sketch57 → Cut-Extrude29 (cut)
    with BuildSketch(Plane.ZY.offset(CUT_EXTRUDE29_START)):
        with Locations((27.5, 7)):
            Circle(SKETCH57_R)
    extrude(amount=CUT_EXTRUDE29_DEPTH, mode=Mode.SUBTRACT)

    # Sketch58 → Cut-Extrude30 (cut)
    with BuildSketch(Plane(origin=(50, 0, 0), x_dir=(0, 0, -1), z_dir=(1, 0, 0))):
        with Locations(Location((-27.5, 7, 0), (0, 0, 180))):
            Circle(SKETCH58_R)
    extrude(amount=-CUT_EXTRUDE30_DEPTH, mode=Mode.SUBTRACT)

    # Chamfer11
    chamfer11_edges = [cut_extrude4_piece_2_2.edges().sort_by_distance(p)[0] for p in [
        (48.75, 12, 32.5),
        (1.25, 12, 32.5),
    ]]
    chamfer(chamfer11_edges, length=CHAMFER11_SIZE)

    # Sketch38 → Boss-Extrude19 (add)
    with BuildSketch(Plane.ZY):
        Polygon((-2.5, 12), (-22.5, 2), (-22.5, -12), (16.5, -12), (22.5, -6), (22.5, 6), (16.5, 12), align=None)
    extrude(amount=BOSS_EXTRUDE19_DEPTH)

    # Sketch39 → Boss-Extrude20 (add)
    with BuildSketch(Plane(origin=(50, 0, 0), x_dir=(0, 0, -1), z_dir=(1, 0, 0))):
        Polygon((-22.5, 6), (-22.5, -6), (-16.5, -12), (22.5, -12), (22.5, 2), (2.5, 12), (-16.5, 12), align=None)
    extrude(amount=BOSS_EXTRUDE20_DEPTH)

    # Chamfer7
    chamfer7_edges = [cut_extrude4_piece_2_2.edges().sort_by_distance(p)[0] for p in [
        (-8, 12, 7),
        (-8, 7, -12.5),
        (-8, -5, -22.5),
        (-8, -12, -3),
        (-8, -9, 19.5),
        (-8, 0, 22.5),
        (-8, 9, 19.5),
        (58, 9, 19.5),
        (58, 0, 22.5),
        (58, -9, 19.5),
        (58, -12, -3),
        (58, -5, -22.5),
        (58, 7, -12.5),
        (58, 12, 7),
    ]]
    chamfer(chamfer7_edges, length=CHAMFER7_SIZE)

    # Chamfer8
    chamfer8_edges = [cut_extrude4_piece_2_2.edges().sort_by_distance(p)[0] for p in [
        (47.5, -12, -3),
        (47.5, -5, -22.5),
        (47.5, -9, 19.5),
        (47.5, 7, -12.5),
    ]]
    chamfer(chamfer8_edges, length=CHAMFER8_SIZE)


solid = cut_extrude4_piece_2_2.part
